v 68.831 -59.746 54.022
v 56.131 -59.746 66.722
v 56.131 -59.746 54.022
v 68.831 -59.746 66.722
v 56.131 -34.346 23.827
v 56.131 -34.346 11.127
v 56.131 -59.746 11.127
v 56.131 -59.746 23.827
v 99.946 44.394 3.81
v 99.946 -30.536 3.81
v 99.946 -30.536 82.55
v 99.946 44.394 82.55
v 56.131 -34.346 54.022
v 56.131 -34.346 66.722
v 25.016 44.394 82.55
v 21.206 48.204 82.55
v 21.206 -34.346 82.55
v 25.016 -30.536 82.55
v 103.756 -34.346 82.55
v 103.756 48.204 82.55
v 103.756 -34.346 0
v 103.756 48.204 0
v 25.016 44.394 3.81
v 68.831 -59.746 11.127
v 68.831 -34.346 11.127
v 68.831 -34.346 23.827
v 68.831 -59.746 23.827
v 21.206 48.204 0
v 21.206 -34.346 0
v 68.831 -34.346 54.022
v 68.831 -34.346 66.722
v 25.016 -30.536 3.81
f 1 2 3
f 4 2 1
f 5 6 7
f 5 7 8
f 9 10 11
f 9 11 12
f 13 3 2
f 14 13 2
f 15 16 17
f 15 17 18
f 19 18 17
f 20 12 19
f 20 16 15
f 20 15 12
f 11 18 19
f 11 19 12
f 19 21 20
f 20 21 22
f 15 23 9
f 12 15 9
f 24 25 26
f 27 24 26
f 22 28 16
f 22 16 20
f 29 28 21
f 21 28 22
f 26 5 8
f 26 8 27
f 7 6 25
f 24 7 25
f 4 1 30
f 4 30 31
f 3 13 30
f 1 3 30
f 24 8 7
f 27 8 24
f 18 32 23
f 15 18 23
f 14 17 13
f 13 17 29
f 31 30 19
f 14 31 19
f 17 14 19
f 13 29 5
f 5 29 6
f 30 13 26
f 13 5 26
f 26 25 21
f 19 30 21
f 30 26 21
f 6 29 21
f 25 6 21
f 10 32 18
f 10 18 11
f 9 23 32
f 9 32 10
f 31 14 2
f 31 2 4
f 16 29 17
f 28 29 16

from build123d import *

# Parameters (mm, degrees)
F0_W     = 82.55
F0_H     = 82.55
F0_W_2   = 74.93
F0_H_2   = 74.93
F1_DEPTH = 82.55
F2_DEPTH = 3.81
F3_W     = 12.7
F3_H     = 12.7
F4_DEPTH = 25.4


with BuildPart() as f1:
    # F0 (on Top) → F1 (new body)
    with BuildSketch(Plane.XY):
        with Locations((62.48099, 6.929023)):
            Rectangle(F0_W, F0_H)
        with Locations((62.48099, 6.929023)):
            Rectangle(F0_W_2, F0_H_2, mode=Mode.SUBTRACT)
    extrude(amount=F1_DEPTH)

    # F0 (on Top) → F2 (join)
    with BuildSketch(Plane.XY):
        with Locations((62.48099, 6.929023)):
            Rectangle(F0_W_2, F0_H_2)
    extrude(amount=F2_DEPTH)

    # F3 (on face) → F4 (join)
    with BuildSketch(Plane.XZ.offset(34.345977)):
        with Locations((62.48099, 60.371522)):
            Rectangle(F3_W, F3_H)
        with Locations((62.48099, 17.477156)):
            Rectangle(F3_W, F3_H)
    extrude(amount=F4_DEPTH)


solid = f1.part
